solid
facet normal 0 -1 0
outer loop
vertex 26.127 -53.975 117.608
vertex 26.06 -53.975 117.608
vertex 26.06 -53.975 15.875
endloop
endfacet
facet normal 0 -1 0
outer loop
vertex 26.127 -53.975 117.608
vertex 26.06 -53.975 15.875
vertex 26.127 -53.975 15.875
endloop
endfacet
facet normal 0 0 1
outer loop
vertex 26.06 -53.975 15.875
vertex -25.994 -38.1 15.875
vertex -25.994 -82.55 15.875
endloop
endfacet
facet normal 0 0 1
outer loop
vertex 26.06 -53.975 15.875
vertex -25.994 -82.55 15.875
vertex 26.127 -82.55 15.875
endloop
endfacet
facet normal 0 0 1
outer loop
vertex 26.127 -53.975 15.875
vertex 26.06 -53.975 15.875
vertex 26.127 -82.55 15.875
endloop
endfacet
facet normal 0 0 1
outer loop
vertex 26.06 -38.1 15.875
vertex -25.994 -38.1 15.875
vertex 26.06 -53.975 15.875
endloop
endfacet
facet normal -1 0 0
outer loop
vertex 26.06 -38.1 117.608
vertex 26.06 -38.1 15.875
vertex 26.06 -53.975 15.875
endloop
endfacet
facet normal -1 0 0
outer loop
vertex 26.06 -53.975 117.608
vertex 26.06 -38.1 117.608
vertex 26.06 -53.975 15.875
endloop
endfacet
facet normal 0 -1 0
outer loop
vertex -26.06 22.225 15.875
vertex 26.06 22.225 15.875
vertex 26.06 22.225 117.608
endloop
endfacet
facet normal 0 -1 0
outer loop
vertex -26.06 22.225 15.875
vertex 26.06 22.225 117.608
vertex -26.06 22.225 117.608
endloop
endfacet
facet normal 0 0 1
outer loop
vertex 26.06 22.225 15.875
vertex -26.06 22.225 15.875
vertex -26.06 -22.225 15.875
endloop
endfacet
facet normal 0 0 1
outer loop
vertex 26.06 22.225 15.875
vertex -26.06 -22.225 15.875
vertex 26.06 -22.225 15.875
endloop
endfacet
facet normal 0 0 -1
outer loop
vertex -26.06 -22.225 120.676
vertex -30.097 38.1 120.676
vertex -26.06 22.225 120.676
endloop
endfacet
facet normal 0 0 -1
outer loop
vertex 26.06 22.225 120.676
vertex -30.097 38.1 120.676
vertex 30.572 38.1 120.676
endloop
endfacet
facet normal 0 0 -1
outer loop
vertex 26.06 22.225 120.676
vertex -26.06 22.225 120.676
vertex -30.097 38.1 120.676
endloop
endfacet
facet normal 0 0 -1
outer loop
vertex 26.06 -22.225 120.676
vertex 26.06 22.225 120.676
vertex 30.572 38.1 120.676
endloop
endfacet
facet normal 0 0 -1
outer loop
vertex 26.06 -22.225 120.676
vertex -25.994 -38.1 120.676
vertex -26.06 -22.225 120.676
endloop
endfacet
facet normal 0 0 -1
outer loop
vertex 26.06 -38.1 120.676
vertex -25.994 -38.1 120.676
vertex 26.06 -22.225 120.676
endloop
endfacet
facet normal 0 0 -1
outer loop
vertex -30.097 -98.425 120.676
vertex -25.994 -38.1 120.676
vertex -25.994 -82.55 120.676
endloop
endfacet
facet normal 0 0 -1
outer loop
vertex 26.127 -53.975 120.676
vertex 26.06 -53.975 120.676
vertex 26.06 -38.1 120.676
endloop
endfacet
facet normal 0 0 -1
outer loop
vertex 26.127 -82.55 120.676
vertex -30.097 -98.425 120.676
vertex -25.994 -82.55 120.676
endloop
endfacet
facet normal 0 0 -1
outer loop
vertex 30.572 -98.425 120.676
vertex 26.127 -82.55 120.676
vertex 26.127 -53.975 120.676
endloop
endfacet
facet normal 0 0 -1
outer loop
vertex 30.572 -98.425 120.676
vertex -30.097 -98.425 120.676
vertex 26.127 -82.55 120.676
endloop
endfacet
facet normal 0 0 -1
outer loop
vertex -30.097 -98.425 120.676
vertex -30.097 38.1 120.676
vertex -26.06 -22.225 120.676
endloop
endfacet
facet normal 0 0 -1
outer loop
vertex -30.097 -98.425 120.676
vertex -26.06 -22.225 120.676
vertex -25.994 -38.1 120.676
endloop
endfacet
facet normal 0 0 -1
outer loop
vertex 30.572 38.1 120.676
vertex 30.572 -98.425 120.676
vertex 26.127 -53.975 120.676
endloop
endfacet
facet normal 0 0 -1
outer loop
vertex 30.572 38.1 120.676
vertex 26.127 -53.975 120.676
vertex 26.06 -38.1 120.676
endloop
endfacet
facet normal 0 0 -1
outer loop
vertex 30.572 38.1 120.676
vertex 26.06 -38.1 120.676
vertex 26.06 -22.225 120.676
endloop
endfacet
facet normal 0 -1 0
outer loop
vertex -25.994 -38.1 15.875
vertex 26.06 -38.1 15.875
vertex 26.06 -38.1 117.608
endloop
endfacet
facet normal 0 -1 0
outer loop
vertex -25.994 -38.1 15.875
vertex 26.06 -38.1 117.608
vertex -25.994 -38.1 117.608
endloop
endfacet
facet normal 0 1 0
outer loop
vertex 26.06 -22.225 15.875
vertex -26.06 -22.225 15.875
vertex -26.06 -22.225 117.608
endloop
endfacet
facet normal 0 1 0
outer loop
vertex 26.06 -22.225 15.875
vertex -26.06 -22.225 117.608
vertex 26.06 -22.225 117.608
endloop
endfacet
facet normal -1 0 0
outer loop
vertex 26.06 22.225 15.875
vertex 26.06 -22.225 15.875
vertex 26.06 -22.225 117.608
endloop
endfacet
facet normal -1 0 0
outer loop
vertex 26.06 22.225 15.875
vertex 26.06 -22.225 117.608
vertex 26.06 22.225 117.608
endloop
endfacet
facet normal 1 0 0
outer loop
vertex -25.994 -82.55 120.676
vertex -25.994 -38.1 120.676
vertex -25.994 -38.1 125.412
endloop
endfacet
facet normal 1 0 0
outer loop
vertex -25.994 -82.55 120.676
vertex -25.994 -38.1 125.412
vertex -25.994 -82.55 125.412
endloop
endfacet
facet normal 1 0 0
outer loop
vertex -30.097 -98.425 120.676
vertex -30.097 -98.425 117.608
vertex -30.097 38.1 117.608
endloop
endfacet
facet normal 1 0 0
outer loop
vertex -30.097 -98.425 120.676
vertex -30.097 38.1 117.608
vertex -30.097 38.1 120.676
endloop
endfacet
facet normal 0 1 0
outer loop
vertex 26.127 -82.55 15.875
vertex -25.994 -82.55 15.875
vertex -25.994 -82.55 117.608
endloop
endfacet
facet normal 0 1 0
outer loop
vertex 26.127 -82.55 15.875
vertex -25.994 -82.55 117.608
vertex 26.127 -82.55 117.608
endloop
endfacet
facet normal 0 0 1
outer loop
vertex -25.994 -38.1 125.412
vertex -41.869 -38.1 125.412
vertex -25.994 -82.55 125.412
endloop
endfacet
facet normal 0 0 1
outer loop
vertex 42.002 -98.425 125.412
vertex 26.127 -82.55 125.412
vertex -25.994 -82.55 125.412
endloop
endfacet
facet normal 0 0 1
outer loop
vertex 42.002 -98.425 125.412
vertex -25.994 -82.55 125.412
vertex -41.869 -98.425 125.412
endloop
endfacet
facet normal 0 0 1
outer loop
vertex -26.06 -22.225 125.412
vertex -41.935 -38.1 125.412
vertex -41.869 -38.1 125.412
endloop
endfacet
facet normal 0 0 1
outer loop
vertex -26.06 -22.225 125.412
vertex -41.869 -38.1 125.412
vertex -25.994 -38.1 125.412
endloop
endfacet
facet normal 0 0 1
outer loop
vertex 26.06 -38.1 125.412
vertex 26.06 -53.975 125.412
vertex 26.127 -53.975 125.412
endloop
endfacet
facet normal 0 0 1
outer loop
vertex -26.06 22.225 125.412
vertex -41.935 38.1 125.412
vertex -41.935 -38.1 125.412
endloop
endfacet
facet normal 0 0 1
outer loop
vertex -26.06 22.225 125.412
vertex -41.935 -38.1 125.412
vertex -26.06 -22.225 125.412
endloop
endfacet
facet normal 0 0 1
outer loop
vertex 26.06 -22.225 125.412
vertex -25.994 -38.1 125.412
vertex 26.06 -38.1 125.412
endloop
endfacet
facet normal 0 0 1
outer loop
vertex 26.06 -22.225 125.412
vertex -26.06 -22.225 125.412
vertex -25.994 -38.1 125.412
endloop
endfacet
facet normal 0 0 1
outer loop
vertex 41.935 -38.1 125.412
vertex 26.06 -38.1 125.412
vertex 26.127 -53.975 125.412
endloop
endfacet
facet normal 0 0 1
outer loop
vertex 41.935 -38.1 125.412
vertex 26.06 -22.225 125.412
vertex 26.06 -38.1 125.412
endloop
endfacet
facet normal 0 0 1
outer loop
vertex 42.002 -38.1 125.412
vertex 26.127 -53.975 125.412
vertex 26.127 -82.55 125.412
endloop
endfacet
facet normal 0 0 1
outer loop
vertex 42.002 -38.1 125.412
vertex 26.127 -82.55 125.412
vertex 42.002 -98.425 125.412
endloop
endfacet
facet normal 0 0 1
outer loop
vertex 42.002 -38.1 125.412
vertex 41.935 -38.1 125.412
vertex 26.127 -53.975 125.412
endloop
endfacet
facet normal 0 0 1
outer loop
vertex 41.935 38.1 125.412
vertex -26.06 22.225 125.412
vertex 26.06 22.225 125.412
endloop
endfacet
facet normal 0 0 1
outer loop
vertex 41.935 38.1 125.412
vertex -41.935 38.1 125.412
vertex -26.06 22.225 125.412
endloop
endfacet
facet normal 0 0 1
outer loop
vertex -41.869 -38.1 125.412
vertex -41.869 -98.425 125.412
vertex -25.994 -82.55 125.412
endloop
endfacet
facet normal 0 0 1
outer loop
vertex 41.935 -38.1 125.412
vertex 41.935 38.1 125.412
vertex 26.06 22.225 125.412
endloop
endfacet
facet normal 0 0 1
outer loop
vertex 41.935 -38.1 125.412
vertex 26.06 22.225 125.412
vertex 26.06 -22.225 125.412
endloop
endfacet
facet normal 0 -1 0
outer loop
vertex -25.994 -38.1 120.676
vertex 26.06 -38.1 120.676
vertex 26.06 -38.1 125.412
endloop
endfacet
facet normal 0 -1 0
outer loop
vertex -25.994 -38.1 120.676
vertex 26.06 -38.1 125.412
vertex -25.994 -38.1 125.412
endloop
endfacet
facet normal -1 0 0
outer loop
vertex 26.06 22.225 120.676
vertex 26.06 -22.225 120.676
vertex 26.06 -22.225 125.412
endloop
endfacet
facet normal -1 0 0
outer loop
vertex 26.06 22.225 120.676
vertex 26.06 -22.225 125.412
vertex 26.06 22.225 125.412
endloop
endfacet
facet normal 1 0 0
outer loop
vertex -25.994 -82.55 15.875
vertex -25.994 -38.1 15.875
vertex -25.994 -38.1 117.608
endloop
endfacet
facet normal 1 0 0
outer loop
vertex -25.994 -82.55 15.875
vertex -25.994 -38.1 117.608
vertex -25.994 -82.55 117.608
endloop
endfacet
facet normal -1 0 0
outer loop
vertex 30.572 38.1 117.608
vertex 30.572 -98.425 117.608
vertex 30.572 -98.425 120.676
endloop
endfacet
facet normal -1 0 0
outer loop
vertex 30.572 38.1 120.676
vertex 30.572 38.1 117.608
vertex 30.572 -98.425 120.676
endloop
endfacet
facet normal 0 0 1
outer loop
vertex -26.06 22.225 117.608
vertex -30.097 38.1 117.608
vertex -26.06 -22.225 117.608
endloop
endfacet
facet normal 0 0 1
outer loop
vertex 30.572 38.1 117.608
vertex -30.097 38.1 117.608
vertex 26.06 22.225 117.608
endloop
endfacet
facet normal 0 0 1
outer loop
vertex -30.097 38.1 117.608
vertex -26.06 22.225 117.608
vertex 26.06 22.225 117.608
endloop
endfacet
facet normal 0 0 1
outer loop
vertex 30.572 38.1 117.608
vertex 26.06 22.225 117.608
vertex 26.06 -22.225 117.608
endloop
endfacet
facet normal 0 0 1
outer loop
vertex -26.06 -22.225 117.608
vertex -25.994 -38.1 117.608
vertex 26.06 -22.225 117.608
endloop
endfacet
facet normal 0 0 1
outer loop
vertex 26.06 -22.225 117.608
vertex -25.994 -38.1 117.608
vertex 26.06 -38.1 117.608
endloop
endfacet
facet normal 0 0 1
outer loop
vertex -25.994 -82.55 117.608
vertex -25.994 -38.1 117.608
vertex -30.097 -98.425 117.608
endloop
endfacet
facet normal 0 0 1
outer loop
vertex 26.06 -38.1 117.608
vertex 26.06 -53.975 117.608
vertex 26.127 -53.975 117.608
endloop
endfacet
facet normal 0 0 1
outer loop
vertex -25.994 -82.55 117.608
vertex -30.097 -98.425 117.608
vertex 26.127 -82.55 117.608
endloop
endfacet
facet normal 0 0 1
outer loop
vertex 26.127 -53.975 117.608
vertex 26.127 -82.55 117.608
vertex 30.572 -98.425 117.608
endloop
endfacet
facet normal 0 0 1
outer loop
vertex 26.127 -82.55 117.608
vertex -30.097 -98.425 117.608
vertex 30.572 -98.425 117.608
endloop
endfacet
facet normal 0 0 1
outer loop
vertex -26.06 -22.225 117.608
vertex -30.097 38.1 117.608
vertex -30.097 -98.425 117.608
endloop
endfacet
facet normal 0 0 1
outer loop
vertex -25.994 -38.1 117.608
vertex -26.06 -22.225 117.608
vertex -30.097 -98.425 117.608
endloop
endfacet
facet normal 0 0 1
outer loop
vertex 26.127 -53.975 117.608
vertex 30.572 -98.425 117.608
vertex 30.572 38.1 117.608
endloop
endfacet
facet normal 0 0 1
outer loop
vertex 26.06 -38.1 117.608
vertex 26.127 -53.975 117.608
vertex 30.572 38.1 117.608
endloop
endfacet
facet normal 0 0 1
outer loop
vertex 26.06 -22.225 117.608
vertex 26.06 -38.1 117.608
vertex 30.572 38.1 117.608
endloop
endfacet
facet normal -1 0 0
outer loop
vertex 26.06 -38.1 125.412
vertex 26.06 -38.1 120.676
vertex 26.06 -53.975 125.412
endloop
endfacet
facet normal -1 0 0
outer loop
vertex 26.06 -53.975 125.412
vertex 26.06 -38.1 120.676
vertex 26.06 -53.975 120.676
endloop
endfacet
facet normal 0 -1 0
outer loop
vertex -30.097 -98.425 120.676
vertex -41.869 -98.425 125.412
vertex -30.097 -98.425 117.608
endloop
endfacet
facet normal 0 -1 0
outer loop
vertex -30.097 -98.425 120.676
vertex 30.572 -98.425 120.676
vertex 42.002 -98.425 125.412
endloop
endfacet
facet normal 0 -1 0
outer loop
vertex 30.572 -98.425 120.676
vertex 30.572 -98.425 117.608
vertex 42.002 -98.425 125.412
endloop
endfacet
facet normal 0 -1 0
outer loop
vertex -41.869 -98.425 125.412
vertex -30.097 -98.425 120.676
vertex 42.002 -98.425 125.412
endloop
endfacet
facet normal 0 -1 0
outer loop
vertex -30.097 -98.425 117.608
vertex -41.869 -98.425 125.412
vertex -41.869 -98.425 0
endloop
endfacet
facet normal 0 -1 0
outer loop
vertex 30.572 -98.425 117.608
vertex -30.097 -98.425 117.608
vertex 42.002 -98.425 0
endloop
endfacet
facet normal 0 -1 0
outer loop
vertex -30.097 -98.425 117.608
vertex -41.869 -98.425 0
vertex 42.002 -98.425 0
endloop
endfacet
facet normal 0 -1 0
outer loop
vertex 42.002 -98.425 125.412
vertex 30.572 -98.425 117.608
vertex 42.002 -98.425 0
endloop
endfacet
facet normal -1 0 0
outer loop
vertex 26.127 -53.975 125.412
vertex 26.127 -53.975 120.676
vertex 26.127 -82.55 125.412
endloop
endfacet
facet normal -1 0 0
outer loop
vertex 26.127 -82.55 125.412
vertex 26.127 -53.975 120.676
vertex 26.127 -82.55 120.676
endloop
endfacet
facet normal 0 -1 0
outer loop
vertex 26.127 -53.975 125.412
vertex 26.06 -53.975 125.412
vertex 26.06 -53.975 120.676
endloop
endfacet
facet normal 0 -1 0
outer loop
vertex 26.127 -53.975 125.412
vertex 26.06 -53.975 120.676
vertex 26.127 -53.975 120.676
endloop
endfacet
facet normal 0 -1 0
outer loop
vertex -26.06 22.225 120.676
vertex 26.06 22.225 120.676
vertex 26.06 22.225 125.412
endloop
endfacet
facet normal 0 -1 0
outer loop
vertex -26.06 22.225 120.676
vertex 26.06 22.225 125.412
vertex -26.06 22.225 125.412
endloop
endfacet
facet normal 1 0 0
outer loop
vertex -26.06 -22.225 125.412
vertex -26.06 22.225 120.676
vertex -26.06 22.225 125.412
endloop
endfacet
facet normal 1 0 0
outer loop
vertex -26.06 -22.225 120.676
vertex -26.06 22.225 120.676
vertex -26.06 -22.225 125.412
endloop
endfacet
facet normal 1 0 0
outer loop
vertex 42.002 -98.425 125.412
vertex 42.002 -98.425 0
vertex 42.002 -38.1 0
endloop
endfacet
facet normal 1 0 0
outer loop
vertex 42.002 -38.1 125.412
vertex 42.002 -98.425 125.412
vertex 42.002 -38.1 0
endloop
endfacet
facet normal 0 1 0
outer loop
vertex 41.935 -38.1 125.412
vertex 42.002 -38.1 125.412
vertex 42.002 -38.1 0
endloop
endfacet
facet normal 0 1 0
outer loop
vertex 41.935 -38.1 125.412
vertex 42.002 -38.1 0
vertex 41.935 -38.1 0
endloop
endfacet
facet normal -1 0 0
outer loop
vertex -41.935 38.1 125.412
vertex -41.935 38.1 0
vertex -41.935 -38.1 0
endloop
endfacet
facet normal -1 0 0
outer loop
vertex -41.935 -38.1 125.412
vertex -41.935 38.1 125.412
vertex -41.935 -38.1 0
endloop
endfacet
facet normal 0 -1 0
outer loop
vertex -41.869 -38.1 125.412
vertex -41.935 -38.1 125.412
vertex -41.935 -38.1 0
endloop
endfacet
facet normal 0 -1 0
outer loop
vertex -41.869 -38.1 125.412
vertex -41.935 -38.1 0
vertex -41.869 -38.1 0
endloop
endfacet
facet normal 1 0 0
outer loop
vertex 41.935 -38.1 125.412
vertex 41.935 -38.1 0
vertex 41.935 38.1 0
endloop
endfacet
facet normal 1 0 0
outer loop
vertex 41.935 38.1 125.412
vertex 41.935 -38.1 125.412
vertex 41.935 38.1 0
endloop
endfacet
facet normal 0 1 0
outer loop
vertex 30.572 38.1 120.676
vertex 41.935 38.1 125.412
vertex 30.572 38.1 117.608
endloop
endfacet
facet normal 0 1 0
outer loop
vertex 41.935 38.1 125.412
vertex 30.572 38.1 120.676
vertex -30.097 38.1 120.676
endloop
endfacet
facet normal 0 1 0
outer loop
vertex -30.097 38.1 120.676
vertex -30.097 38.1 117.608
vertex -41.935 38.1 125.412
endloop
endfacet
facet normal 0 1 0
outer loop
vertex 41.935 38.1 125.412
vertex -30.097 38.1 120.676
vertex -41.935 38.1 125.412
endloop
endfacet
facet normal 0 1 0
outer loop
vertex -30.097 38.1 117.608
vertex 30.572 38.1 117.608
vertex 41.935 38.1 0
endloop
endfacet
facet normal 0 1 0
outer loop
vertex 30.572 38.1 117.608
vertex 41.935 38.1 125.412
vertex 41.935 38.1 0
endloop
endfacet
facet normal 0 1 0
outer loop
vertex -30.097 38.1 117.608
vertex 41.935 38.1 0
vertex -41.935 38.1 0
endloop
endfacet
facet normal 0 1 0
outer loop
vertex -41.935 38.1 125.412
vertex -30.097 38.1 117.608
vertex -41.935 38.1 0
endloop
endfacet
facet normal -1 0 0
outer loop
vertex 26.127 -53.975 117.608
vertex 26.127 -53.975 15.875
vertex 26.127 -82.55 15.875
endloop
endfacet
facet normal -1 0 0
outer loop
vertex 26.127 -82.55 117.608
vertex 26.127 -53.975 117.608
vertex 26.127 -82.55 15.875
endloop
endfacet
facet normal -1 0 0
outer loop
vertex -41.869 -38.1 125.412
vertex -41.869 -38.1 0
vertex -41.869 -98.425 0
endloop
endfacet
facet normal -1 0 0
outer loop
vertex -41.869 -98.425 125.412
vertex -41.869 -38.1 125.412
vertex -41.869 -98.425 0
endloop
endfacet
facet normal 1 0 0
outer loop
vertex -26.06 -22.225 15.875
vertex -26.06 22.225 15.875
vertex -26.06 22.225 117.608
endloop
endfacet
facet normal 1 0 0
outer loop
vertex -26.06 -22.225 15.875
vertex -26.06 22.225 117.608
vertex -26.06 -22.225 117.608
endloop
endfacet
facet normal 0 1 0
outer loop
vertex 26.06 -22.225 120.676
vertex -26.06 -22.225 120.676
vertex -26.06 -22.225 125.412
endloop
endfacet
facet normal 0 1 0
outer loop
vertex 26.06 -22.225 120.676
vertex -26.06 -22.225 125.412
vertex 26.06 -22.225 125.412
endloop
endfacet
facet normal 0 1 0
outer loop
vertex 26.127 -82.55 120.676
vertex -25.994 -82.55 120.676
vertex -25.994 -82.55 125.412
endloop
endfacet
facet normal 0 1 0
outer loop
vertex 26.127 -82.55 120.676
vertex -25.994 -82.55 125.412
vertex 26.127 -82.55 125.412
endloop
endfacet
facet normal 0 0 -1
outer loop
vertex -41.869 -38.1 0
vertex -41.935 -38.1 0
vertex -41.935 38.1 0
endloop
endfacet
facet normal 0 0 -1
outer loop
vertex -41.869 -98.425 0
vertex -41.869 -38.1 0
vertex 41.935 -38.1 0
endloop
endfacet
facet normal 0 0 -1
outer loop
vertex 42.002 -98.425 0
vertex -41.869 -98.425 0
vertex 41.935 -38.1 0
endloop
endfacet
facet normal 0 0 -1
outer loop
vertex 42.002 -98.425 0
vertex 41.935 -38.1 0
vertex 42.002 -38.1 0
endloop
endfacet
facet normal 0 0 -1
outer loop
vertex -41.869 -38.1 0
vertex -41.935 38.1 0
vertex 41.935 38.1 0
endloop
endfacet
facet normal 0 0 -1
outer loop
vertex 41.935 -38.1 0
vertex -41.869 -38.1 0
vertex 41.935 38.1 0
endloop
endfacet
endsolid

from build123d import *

# Parameters (mm, degrees)
F1_DEPTH      = 125.4125
F2_T          = -15.875
F4_DEPTH      = 125.4125
F5_T          = -15.875
F7_W          = 60.6690326877
F7_H          = 3.0675412395
F8_DEPTH      = 182.626
F8_DEPTH_BACK = 25.4


# Not quite as in the source:
# - a shell that OpenCascade refuses in one call is made with other operations: the cavity is built on its own and cut out


with BuildPart() as f1:
    # F0 (on Top) → F1 (new body)
    with BuildSketch(Plane.XY):
        Polygon((41.9354, 38.1), (-41.9354, 38.1), (-41.9354, -38.1), align=None)
        Polygon((41.9354, -38.1), (41.9354, 38.1), (-41.9354, -38.1), align=None)
    extrude(amount=F1_DEPTH)

    # F2
    f2_openings = [f1.faces().sort_by_distance(p)[0] for p in [
        (0, 0, 125.4125),
    ]]
    offset(amount=F2_T, openings=f2_openings)

    # F3 (on Top) → F4 (join)
    with BuildSketch(Plane.XY):
        Polygon((42.0021460263, -98.425), (-41.8686539737, -38.1), (-41.8686539737, -98.425), align=None)
        Polygon((42.0021460263, -38.1), (-41.8686539737, -38.1), (42.0021460263, -98.425), align=None)
    extrude(amount=F4_DEPTH)

    # F5: a shell. OpenCascade refuses it in one call, so the cavity is built on its own and cut out:
    # the body offset inwards by the wall thickness, plus a prism from it out through each open face.
    f5_core = offset(f1.part, amount=F5_T, kind=Kind.INTERSECTION, mode=Mode.PRIVATE)
    f5_exits = [f5_core.faces().sort_by_distance(p)[0] for p in [
        (0.054837, -60.331537, 109.5375),
    ]]
    add(f5_core, mode=Mode.SUBTRACT)
    extrude(f5_exits, amount=-F5_T, mode=Mode.SUBTRACT)

    # F7 (on offset) → F8 (cut, two sides)
    with BuildSketch(Plane.XZ.offset(123.825)) as f8_sk:
        with Locations((0.2376296824, 119.1418357193)):
            Rectangle(F7_W, F7_H)
    extrude(amount=-F8_DEPTH, mode=Mode.SUBTRACT)
    extrude(f8_sk.sketch, amount=F8_DEPTH_BACK, mode=Mode.SUBTRACT)


solid = f1.part
